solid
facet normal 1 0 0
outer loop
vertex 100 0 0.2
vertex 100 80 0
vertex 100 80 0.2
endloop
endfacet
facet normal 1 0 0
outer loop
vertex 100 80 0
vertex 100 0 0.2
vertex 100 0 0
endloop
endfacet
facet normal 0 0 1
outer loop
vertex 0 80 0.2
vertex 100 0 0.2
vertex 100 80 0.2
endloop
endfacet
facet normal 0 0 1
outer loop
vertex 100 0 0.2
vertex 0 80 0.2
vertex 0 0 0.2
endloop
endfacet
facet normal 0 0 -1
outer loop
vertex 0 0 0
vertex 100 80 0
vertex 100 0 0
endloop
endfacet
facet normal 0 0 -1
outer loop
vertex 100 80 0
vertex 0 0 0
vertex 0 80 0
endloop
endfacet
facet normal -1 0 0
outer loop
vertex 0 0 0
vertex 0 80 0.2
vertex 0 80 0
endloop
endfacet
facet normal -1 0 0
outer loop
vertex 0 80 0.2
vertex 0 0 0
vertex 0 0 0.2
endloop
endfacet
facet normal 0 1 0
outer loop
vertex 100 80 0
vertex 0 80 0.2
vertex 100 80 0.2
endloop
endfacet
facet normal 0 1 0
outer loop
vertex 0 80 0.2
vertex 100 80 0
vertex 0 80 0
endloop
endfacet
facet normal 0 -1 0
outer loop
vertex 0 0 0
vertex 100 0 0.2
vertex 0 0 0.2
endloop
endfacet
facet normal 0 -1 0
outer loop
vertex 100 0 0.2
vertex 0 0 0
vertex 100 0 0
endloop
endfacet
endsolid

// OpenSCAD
difference(){
    cube([100,80,0.2]);
    translate([-100,140,-0.05]) linear_extrude(.3) import("Teensy_board_07_adc_buffer-B_Paste.dxf");
}
